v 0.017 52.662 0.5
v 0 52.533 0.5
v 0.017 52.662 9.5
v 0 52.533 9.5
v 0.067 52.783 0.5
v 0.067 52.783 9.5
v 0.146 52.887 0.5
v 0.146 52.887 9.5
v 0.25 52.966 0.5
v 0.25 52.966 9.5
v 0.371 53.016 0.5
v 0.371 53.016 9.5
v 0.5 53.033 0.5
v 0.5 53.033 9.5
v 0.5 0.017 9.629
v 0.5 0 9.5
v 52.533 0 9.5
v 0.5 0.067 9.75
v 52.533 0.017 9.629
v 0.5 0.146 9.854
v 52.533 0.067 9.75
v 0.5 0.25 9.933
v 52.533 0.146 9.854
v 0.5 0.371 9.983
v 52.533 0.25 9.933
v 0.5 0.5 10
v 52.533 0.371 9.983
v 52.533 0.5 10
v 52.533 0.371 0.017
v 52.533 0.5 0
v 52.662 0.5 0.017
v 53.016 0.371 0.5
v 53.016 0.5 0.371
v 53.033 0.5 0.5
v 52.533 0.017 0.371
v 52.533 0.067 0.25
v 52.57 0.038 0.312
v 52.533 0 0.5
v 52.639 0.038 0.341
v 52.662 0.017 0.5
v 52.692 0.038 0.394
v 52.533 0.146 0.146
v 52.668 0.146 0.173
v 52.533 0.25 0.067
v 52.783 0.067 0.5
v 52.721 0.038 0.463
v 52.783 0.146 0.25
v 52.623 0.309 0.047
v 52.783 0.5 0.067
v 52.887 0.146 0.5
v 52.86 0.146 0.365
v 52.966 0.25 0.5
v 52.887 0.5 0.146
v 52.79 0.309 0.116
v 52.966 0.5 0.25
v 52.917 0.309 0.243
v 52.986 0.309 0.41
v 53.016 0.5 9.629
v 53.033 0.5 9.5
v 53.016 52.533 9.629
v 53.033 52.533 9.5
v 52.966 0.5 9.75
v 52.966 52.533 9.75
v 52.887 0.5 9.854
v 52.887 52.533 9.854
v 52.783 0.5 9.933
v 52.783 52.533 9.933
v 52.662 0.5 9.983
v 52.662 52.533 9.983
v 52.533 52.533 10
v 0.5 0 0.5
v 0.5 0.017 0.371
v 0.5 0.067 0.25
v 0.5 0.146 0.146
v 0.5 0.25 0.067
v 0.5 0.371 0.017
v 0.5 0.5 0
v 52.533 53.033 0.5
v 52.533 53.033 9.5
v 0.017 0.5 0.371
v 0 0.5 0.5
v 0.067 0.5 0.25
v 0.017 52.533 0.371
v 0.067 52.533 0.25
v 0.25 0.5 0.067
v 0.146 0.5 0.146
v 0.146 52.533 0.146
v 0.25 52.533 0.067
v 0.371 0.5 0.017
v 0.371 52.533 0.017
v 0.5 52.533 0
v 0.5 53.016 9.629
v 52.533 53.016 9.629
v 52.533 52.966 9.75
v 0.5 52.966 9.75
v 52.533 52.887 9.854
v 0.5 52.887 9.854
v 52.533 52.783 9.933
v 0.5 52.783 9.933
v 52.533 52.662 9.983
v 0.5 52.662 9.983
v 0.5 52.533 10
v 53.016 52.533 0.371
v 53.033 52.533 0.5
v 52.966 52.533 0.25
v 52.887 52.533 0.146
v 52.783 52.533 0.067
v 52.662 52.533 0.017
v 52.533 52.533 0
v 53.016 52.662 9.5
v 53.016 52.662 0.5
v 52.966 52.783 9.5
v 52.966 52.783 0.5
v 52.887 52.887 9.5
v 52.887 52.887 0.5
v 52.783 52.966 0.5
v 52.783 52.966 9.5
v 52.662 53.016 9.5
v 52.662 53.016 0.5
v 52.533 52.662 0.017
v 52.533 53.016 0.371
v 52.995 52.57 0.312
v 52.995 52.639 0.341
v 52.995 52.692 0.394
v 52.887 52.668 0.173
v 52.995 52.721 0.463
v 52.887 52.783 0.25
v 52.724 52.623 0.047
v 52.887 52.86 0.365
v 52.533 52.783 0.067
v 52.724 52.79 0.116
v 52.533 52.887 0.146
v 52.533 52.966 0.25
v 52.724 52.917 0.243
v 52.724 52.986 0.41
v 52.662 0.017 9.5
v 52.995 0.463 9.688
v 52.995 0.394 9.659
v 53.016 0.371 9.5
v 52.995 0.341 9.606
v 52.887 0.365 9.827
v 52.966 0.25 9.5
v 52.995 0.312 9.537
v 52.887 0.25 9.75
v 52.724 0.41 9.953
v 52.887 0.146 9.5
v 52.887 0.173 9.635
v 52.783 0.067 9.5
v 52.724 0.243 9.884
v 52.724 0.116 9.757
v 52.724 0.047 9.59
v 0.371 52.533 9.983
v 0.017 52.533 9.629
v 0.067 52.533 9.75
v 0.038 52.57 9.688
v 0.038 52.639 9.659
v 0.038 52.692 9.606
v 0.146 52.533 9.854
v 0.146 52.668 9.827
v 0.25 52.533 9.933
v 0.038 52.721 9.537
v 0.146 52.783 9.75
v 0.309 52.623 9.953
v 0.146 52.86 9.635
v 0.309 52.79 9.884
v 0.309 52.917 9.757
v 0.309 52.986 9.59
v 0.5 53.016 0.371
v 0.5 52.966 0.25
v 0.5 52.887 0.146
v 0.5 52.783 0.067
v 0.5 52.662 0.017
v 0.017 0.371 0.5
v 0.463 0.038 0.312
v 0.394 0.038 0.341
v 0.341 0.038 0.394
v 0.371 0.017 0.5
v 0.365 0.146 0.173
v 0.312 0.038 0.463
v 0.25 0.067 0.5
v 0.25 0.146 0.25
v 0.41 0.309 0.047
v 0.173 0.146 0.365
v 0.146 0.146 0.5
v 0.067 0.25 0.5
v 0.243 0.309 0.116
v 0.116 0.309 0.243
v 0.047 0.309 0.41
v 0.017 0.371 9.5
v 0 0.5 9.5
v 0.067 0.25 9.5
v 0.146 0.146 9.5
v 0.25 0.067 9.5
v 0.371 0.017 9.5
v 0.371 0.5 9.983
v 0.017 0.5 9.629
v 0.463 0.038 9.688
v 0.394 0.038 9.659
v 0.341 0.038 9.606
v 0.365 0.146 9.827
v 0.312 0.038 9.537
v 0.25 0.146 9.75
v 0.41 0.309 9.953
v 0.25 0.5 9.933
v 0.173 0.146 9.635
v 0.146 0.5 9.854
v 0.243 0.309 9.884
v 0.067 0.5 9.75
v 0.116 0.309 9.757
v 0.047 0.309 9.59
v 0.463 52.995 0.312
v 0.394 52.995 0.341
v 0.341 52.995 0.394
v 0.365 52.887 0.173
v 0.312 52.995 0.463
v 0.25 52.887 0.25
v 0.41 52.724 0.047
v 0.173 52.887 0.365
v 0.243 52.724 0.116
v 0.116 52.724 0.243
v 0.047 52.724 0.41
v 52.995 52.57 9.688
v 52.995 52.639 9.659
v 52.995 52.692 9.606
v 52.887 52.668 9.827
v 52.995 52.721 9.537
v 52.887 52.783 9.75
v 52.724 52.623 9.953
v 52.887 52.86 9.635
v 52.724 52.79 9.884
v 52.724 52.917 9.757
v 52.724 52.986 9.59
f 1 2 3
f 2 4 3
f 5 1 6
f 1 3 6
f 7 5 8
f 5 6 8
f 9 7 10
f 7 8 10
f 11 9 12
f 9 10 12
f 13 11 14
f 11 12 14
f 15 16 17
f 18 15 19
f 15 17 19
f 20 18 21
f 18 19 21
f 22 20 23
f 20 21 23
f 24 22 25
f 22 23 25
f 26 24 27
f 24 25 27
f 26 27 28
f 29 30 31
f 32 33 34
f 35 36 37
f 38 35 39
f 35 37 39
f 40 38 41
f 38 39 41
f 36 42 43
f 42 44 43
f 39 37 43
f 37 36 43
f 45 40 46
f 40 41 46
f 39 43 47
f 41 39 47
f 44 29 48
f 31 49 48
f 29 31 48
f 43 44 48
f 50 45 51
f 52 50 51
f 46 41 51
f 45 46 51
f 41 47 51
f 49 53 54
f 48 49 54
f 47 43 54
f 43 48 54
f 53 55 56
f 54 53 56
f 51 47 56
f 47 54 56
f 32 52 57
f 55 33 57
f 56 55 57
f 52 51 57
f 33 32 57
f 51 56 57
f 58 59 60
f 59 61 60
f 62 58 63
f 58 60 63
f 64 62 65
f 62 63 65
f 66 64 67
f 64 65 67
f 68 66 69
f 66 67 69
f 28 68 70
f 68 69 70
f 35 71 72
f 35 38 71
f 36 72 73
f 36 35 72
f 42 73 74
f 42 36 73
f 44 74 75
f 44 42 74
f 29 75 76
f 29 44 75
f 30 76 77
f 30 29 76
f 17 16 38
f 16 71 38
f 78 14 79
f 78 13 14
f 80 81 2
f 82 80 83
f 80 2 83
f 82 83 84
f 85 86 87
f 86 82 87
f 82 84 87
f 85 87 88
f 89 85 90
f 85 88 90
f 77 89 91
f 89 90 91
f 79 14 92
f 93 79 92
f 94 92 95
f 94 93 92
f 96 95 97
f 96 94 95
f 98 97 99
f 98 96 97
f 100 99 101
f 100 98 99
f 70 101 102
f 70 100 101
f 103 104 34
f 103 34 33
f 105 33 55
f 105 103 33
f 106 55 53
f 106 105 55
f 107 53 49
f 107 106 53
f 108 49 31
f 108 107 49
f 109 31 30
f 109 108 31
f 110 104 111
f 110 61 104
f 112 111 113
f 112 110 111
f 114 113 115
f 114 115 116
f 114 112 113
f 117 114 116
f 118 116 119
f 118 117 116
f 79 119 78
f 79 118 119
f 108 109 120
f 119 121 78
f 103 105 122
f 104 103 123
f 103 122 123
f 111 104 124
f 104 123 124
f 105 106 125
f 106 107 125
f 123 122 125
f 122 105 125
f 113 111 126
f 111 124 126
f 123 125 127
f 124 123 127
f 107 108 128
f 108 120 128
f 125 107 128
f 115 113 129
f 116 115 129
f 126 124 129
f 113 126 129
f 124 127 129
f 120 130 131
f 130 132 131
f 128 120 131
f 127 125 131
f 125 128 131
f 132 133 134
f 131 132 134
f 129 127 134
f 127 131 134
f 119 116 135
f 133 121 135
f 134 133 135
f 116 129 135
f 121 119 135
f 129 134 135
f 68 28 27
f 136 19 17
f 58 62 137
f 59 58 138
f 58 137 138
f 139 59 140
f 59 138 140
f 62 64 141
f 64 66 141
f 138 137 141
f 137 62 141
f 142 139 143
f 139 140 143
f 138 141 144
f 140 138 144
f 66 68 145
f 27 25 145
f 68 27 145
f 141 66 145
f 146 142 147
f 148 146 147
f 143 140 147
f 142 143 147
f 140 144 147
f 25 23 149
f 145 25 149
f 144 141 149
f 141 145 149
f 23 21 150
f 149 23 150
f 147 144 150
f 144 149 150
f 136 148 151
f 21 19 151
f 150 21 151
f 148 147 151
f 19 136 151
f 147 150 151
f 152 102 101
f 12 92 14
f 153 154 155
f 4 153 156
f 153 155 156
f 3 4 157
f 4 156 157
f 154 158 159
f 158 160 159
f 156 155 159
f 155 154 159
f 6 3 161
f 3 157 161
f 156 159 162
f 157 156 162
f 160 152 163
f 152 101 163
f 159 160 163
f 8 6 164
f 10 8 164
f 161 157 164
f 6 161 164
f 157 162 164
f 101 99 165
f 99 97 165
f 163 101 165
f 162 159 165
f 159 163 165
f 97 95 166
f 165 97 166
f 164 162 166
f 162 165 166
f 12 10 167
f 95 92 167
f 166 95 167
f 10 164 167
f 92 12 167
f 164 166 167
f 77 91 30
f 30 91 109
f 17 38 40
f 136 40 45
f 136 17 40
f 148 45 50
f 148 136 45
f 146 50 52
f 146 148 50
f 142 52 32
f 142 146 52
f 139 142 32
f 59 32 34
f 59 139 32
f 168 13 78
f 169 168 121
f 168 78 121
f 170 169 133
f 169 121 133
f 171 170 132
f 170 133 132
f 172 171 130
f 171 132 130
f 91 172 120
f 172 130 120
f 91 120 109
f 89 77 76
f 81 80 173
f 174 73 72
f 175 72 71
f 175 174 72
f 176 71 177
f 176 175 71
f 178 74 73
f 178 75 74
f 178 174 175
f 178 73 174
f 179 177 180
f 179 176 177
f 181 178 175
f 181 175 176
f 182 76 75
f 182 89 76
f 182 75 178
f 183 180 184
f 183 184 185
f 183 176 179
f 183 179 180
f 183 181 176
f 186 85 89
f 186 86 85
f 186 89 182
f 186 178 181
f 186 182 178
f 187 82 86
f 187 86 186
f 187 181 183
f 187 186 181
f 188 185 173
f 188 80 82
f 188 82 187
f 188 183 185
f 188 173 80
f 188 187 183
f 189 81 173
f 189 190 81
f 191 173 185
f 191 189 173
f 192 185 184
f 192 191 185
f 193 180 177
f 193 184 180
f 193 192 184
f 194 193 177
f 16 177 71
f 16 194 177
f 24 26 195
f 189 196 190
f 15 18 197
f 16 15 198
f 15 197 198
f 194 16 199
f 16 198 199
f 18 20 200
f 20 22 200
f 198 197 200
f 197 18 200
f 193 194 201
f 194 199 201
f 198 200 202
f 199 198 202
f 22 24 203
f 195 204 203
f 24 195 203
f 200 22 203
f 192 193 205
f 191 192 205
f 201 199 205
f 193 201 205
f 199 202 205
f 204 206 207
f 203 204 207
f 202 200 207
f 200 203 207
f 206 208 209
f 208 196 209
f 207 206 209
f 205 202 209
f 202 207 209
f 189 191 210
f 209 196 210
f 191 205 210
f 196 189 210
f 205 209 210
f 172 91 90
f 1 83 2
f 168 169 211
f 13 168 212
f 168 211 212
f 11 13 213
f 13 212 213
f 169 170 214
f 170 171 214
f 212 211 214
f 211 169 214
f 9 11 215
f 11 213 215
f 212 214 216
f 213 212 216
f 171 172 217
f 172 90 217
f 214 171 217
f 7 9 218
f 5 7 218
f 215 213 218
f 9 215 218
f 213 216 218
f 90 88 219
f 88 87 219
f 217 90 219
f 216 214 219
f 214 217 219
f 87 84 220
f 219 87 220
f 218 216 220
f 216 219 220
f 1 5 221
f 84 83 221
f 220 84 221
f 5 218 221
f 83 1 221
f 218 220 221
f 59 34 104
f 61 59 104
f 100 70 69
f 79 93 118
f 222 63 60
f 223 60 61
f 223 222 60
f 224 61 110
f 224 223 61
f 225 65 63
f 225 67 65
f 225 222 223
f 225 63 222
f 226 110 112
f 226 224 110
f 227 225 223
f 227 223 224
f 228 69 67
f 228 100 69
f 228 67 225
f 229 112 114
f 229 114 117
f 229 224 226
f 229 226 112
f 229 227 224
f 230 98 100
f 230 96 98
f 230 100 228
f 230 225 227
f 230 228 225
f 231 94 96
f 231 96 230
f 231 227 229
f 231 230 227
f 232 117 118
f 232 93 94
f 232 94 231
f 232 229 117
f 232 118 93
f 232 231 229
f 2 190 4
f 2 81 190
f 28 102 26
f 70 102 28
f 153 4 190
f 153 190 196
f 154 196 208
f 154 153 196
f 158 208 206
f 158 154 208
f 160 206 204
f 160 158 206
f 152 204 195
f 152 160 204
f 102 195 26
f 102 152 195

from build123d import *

# Parameters (mm, degrees)
SKETCH_1_W      = 53.033008589
SKETCH_1_H      = 53.033008589
EXTRUDE_1_DEPTH = 10
FILLET_1_R      = 0.5


with BuildPart() as part:
    # 草图1 → 凸台-拉伸1 (new body)
    with BuildSketch(Plane.XY):
        with Locations((26.516504295, 26.516504295)):
            Rectangle(SKETCH_1_W, SKETCH_1_H)
    extrude(amount=EXTRUDE_1_DEPTH)

    # 圆角1
    fillet_1_edges = [part.edges().sort_by_distance(p)[0] for p in [
        (26.516504294, 53.033008589, 10),
        (0, 26.516504294, 10),
        (26.516504294, 0, 10),
        (0, 26.516504294, 0),
        (26.516504294, 53.033008589, 0),
        (53.033008589, 26.516504294, 0),
        (26.516504294, 0, 0),
        (53.033008589, 26.516504294, 10),
        (0, 0, 5),
        (0, 53.033008589, 5),
        (53.033008589, 53.033008589, 5),
        (53.033008589, 0, 5),
    ]]
    fillet(fillet_1_edges, radius=FILLET_1_R)


solid = part.part
